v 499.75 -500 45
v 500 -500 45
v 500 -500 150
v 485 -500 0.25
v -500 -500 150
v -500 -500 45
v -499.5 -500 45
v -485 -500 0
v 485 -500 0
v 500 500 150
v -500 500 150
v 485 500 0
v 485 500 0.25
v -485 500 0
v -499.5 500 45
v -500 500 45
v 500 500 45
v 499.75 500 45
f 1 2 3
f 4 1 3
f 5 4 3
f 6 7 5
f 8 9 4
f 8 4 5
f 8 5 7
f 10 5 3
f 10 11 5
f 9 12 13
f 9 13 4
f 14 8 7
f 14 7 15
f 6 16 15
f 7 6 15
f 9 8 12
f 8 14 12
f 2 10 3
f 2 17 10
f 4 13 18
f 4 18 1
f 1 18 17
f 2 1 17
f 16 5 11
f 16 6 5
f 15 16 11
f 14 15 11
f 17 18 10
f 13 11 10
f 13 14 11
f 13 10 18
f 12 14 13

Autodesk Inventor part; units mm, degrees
ref_plane "YZ Plane" through (0, 0, 0) normal (1, 0, 0) x (0, 1, 0)
ref_plane "XZ Plane" through (0, 0, 0) normal (0, 1, 0) x (-1, 0, 0)
ref_plane "XY Plane" through (0, 0, 0) normal (0, 0, 1) x (1, 0, 0)
sketch "草图1" plane through (0, 0, 0) normal (0, 0, 1) x (1, 0, 0)
  line L0 (485, -500) -> (-485, -500)
  line L1 (-485, -500) -> (-485, 500)
  line L2 (-485, 500) -> (485, 500)
  line L3 (485, 500) -> (485, -500)
  line L4 (485, -500) -> (-485, 500) construction
  line L5 (-485, -500) -> (485, 500) construction
  point P0 (0, 0)
  dimension "d0" = 1000
  dimension "d1" = 970
extrude "拉伸1" add sketch "草图1" along normal blind 45
sketch "草图2" plane through (0, 0, 45) normal (0, 0, 1) x (1, 0, 0)
  line L0 (500, -500) -> (-500, -500)
  line L1 (-500, -500) -> (-500, 500)
  line L2 (-500, 500) -> (500, 500)
  line L3 (500, 500) -> (500, -500)
  line L4 (500, -500) -> (-500, 500) construction
  line L5 (-500, -500) -> (500, 500) construction
  line L6 (485, 500) -> (-485, 500) projected
  line L7 (-485, 500) -> (-485, -500) projected
  point P0 (0, 0)
  point P1 (-485, 500)
  dimension "d5" = 1000
extrude "拉伸2" add sketch "草图2" along normal blind 105
chamfer "倒角1" distance 14.5 distance2 45 1 edges at (-485, 0, 45) measured on face at (-490, 166.6667, 45)
chamfer "倒角2" distance 14.75 distance2 44.75 1 edges at (485, 0, 45) measured on face at (495, 166.6667, 45)
